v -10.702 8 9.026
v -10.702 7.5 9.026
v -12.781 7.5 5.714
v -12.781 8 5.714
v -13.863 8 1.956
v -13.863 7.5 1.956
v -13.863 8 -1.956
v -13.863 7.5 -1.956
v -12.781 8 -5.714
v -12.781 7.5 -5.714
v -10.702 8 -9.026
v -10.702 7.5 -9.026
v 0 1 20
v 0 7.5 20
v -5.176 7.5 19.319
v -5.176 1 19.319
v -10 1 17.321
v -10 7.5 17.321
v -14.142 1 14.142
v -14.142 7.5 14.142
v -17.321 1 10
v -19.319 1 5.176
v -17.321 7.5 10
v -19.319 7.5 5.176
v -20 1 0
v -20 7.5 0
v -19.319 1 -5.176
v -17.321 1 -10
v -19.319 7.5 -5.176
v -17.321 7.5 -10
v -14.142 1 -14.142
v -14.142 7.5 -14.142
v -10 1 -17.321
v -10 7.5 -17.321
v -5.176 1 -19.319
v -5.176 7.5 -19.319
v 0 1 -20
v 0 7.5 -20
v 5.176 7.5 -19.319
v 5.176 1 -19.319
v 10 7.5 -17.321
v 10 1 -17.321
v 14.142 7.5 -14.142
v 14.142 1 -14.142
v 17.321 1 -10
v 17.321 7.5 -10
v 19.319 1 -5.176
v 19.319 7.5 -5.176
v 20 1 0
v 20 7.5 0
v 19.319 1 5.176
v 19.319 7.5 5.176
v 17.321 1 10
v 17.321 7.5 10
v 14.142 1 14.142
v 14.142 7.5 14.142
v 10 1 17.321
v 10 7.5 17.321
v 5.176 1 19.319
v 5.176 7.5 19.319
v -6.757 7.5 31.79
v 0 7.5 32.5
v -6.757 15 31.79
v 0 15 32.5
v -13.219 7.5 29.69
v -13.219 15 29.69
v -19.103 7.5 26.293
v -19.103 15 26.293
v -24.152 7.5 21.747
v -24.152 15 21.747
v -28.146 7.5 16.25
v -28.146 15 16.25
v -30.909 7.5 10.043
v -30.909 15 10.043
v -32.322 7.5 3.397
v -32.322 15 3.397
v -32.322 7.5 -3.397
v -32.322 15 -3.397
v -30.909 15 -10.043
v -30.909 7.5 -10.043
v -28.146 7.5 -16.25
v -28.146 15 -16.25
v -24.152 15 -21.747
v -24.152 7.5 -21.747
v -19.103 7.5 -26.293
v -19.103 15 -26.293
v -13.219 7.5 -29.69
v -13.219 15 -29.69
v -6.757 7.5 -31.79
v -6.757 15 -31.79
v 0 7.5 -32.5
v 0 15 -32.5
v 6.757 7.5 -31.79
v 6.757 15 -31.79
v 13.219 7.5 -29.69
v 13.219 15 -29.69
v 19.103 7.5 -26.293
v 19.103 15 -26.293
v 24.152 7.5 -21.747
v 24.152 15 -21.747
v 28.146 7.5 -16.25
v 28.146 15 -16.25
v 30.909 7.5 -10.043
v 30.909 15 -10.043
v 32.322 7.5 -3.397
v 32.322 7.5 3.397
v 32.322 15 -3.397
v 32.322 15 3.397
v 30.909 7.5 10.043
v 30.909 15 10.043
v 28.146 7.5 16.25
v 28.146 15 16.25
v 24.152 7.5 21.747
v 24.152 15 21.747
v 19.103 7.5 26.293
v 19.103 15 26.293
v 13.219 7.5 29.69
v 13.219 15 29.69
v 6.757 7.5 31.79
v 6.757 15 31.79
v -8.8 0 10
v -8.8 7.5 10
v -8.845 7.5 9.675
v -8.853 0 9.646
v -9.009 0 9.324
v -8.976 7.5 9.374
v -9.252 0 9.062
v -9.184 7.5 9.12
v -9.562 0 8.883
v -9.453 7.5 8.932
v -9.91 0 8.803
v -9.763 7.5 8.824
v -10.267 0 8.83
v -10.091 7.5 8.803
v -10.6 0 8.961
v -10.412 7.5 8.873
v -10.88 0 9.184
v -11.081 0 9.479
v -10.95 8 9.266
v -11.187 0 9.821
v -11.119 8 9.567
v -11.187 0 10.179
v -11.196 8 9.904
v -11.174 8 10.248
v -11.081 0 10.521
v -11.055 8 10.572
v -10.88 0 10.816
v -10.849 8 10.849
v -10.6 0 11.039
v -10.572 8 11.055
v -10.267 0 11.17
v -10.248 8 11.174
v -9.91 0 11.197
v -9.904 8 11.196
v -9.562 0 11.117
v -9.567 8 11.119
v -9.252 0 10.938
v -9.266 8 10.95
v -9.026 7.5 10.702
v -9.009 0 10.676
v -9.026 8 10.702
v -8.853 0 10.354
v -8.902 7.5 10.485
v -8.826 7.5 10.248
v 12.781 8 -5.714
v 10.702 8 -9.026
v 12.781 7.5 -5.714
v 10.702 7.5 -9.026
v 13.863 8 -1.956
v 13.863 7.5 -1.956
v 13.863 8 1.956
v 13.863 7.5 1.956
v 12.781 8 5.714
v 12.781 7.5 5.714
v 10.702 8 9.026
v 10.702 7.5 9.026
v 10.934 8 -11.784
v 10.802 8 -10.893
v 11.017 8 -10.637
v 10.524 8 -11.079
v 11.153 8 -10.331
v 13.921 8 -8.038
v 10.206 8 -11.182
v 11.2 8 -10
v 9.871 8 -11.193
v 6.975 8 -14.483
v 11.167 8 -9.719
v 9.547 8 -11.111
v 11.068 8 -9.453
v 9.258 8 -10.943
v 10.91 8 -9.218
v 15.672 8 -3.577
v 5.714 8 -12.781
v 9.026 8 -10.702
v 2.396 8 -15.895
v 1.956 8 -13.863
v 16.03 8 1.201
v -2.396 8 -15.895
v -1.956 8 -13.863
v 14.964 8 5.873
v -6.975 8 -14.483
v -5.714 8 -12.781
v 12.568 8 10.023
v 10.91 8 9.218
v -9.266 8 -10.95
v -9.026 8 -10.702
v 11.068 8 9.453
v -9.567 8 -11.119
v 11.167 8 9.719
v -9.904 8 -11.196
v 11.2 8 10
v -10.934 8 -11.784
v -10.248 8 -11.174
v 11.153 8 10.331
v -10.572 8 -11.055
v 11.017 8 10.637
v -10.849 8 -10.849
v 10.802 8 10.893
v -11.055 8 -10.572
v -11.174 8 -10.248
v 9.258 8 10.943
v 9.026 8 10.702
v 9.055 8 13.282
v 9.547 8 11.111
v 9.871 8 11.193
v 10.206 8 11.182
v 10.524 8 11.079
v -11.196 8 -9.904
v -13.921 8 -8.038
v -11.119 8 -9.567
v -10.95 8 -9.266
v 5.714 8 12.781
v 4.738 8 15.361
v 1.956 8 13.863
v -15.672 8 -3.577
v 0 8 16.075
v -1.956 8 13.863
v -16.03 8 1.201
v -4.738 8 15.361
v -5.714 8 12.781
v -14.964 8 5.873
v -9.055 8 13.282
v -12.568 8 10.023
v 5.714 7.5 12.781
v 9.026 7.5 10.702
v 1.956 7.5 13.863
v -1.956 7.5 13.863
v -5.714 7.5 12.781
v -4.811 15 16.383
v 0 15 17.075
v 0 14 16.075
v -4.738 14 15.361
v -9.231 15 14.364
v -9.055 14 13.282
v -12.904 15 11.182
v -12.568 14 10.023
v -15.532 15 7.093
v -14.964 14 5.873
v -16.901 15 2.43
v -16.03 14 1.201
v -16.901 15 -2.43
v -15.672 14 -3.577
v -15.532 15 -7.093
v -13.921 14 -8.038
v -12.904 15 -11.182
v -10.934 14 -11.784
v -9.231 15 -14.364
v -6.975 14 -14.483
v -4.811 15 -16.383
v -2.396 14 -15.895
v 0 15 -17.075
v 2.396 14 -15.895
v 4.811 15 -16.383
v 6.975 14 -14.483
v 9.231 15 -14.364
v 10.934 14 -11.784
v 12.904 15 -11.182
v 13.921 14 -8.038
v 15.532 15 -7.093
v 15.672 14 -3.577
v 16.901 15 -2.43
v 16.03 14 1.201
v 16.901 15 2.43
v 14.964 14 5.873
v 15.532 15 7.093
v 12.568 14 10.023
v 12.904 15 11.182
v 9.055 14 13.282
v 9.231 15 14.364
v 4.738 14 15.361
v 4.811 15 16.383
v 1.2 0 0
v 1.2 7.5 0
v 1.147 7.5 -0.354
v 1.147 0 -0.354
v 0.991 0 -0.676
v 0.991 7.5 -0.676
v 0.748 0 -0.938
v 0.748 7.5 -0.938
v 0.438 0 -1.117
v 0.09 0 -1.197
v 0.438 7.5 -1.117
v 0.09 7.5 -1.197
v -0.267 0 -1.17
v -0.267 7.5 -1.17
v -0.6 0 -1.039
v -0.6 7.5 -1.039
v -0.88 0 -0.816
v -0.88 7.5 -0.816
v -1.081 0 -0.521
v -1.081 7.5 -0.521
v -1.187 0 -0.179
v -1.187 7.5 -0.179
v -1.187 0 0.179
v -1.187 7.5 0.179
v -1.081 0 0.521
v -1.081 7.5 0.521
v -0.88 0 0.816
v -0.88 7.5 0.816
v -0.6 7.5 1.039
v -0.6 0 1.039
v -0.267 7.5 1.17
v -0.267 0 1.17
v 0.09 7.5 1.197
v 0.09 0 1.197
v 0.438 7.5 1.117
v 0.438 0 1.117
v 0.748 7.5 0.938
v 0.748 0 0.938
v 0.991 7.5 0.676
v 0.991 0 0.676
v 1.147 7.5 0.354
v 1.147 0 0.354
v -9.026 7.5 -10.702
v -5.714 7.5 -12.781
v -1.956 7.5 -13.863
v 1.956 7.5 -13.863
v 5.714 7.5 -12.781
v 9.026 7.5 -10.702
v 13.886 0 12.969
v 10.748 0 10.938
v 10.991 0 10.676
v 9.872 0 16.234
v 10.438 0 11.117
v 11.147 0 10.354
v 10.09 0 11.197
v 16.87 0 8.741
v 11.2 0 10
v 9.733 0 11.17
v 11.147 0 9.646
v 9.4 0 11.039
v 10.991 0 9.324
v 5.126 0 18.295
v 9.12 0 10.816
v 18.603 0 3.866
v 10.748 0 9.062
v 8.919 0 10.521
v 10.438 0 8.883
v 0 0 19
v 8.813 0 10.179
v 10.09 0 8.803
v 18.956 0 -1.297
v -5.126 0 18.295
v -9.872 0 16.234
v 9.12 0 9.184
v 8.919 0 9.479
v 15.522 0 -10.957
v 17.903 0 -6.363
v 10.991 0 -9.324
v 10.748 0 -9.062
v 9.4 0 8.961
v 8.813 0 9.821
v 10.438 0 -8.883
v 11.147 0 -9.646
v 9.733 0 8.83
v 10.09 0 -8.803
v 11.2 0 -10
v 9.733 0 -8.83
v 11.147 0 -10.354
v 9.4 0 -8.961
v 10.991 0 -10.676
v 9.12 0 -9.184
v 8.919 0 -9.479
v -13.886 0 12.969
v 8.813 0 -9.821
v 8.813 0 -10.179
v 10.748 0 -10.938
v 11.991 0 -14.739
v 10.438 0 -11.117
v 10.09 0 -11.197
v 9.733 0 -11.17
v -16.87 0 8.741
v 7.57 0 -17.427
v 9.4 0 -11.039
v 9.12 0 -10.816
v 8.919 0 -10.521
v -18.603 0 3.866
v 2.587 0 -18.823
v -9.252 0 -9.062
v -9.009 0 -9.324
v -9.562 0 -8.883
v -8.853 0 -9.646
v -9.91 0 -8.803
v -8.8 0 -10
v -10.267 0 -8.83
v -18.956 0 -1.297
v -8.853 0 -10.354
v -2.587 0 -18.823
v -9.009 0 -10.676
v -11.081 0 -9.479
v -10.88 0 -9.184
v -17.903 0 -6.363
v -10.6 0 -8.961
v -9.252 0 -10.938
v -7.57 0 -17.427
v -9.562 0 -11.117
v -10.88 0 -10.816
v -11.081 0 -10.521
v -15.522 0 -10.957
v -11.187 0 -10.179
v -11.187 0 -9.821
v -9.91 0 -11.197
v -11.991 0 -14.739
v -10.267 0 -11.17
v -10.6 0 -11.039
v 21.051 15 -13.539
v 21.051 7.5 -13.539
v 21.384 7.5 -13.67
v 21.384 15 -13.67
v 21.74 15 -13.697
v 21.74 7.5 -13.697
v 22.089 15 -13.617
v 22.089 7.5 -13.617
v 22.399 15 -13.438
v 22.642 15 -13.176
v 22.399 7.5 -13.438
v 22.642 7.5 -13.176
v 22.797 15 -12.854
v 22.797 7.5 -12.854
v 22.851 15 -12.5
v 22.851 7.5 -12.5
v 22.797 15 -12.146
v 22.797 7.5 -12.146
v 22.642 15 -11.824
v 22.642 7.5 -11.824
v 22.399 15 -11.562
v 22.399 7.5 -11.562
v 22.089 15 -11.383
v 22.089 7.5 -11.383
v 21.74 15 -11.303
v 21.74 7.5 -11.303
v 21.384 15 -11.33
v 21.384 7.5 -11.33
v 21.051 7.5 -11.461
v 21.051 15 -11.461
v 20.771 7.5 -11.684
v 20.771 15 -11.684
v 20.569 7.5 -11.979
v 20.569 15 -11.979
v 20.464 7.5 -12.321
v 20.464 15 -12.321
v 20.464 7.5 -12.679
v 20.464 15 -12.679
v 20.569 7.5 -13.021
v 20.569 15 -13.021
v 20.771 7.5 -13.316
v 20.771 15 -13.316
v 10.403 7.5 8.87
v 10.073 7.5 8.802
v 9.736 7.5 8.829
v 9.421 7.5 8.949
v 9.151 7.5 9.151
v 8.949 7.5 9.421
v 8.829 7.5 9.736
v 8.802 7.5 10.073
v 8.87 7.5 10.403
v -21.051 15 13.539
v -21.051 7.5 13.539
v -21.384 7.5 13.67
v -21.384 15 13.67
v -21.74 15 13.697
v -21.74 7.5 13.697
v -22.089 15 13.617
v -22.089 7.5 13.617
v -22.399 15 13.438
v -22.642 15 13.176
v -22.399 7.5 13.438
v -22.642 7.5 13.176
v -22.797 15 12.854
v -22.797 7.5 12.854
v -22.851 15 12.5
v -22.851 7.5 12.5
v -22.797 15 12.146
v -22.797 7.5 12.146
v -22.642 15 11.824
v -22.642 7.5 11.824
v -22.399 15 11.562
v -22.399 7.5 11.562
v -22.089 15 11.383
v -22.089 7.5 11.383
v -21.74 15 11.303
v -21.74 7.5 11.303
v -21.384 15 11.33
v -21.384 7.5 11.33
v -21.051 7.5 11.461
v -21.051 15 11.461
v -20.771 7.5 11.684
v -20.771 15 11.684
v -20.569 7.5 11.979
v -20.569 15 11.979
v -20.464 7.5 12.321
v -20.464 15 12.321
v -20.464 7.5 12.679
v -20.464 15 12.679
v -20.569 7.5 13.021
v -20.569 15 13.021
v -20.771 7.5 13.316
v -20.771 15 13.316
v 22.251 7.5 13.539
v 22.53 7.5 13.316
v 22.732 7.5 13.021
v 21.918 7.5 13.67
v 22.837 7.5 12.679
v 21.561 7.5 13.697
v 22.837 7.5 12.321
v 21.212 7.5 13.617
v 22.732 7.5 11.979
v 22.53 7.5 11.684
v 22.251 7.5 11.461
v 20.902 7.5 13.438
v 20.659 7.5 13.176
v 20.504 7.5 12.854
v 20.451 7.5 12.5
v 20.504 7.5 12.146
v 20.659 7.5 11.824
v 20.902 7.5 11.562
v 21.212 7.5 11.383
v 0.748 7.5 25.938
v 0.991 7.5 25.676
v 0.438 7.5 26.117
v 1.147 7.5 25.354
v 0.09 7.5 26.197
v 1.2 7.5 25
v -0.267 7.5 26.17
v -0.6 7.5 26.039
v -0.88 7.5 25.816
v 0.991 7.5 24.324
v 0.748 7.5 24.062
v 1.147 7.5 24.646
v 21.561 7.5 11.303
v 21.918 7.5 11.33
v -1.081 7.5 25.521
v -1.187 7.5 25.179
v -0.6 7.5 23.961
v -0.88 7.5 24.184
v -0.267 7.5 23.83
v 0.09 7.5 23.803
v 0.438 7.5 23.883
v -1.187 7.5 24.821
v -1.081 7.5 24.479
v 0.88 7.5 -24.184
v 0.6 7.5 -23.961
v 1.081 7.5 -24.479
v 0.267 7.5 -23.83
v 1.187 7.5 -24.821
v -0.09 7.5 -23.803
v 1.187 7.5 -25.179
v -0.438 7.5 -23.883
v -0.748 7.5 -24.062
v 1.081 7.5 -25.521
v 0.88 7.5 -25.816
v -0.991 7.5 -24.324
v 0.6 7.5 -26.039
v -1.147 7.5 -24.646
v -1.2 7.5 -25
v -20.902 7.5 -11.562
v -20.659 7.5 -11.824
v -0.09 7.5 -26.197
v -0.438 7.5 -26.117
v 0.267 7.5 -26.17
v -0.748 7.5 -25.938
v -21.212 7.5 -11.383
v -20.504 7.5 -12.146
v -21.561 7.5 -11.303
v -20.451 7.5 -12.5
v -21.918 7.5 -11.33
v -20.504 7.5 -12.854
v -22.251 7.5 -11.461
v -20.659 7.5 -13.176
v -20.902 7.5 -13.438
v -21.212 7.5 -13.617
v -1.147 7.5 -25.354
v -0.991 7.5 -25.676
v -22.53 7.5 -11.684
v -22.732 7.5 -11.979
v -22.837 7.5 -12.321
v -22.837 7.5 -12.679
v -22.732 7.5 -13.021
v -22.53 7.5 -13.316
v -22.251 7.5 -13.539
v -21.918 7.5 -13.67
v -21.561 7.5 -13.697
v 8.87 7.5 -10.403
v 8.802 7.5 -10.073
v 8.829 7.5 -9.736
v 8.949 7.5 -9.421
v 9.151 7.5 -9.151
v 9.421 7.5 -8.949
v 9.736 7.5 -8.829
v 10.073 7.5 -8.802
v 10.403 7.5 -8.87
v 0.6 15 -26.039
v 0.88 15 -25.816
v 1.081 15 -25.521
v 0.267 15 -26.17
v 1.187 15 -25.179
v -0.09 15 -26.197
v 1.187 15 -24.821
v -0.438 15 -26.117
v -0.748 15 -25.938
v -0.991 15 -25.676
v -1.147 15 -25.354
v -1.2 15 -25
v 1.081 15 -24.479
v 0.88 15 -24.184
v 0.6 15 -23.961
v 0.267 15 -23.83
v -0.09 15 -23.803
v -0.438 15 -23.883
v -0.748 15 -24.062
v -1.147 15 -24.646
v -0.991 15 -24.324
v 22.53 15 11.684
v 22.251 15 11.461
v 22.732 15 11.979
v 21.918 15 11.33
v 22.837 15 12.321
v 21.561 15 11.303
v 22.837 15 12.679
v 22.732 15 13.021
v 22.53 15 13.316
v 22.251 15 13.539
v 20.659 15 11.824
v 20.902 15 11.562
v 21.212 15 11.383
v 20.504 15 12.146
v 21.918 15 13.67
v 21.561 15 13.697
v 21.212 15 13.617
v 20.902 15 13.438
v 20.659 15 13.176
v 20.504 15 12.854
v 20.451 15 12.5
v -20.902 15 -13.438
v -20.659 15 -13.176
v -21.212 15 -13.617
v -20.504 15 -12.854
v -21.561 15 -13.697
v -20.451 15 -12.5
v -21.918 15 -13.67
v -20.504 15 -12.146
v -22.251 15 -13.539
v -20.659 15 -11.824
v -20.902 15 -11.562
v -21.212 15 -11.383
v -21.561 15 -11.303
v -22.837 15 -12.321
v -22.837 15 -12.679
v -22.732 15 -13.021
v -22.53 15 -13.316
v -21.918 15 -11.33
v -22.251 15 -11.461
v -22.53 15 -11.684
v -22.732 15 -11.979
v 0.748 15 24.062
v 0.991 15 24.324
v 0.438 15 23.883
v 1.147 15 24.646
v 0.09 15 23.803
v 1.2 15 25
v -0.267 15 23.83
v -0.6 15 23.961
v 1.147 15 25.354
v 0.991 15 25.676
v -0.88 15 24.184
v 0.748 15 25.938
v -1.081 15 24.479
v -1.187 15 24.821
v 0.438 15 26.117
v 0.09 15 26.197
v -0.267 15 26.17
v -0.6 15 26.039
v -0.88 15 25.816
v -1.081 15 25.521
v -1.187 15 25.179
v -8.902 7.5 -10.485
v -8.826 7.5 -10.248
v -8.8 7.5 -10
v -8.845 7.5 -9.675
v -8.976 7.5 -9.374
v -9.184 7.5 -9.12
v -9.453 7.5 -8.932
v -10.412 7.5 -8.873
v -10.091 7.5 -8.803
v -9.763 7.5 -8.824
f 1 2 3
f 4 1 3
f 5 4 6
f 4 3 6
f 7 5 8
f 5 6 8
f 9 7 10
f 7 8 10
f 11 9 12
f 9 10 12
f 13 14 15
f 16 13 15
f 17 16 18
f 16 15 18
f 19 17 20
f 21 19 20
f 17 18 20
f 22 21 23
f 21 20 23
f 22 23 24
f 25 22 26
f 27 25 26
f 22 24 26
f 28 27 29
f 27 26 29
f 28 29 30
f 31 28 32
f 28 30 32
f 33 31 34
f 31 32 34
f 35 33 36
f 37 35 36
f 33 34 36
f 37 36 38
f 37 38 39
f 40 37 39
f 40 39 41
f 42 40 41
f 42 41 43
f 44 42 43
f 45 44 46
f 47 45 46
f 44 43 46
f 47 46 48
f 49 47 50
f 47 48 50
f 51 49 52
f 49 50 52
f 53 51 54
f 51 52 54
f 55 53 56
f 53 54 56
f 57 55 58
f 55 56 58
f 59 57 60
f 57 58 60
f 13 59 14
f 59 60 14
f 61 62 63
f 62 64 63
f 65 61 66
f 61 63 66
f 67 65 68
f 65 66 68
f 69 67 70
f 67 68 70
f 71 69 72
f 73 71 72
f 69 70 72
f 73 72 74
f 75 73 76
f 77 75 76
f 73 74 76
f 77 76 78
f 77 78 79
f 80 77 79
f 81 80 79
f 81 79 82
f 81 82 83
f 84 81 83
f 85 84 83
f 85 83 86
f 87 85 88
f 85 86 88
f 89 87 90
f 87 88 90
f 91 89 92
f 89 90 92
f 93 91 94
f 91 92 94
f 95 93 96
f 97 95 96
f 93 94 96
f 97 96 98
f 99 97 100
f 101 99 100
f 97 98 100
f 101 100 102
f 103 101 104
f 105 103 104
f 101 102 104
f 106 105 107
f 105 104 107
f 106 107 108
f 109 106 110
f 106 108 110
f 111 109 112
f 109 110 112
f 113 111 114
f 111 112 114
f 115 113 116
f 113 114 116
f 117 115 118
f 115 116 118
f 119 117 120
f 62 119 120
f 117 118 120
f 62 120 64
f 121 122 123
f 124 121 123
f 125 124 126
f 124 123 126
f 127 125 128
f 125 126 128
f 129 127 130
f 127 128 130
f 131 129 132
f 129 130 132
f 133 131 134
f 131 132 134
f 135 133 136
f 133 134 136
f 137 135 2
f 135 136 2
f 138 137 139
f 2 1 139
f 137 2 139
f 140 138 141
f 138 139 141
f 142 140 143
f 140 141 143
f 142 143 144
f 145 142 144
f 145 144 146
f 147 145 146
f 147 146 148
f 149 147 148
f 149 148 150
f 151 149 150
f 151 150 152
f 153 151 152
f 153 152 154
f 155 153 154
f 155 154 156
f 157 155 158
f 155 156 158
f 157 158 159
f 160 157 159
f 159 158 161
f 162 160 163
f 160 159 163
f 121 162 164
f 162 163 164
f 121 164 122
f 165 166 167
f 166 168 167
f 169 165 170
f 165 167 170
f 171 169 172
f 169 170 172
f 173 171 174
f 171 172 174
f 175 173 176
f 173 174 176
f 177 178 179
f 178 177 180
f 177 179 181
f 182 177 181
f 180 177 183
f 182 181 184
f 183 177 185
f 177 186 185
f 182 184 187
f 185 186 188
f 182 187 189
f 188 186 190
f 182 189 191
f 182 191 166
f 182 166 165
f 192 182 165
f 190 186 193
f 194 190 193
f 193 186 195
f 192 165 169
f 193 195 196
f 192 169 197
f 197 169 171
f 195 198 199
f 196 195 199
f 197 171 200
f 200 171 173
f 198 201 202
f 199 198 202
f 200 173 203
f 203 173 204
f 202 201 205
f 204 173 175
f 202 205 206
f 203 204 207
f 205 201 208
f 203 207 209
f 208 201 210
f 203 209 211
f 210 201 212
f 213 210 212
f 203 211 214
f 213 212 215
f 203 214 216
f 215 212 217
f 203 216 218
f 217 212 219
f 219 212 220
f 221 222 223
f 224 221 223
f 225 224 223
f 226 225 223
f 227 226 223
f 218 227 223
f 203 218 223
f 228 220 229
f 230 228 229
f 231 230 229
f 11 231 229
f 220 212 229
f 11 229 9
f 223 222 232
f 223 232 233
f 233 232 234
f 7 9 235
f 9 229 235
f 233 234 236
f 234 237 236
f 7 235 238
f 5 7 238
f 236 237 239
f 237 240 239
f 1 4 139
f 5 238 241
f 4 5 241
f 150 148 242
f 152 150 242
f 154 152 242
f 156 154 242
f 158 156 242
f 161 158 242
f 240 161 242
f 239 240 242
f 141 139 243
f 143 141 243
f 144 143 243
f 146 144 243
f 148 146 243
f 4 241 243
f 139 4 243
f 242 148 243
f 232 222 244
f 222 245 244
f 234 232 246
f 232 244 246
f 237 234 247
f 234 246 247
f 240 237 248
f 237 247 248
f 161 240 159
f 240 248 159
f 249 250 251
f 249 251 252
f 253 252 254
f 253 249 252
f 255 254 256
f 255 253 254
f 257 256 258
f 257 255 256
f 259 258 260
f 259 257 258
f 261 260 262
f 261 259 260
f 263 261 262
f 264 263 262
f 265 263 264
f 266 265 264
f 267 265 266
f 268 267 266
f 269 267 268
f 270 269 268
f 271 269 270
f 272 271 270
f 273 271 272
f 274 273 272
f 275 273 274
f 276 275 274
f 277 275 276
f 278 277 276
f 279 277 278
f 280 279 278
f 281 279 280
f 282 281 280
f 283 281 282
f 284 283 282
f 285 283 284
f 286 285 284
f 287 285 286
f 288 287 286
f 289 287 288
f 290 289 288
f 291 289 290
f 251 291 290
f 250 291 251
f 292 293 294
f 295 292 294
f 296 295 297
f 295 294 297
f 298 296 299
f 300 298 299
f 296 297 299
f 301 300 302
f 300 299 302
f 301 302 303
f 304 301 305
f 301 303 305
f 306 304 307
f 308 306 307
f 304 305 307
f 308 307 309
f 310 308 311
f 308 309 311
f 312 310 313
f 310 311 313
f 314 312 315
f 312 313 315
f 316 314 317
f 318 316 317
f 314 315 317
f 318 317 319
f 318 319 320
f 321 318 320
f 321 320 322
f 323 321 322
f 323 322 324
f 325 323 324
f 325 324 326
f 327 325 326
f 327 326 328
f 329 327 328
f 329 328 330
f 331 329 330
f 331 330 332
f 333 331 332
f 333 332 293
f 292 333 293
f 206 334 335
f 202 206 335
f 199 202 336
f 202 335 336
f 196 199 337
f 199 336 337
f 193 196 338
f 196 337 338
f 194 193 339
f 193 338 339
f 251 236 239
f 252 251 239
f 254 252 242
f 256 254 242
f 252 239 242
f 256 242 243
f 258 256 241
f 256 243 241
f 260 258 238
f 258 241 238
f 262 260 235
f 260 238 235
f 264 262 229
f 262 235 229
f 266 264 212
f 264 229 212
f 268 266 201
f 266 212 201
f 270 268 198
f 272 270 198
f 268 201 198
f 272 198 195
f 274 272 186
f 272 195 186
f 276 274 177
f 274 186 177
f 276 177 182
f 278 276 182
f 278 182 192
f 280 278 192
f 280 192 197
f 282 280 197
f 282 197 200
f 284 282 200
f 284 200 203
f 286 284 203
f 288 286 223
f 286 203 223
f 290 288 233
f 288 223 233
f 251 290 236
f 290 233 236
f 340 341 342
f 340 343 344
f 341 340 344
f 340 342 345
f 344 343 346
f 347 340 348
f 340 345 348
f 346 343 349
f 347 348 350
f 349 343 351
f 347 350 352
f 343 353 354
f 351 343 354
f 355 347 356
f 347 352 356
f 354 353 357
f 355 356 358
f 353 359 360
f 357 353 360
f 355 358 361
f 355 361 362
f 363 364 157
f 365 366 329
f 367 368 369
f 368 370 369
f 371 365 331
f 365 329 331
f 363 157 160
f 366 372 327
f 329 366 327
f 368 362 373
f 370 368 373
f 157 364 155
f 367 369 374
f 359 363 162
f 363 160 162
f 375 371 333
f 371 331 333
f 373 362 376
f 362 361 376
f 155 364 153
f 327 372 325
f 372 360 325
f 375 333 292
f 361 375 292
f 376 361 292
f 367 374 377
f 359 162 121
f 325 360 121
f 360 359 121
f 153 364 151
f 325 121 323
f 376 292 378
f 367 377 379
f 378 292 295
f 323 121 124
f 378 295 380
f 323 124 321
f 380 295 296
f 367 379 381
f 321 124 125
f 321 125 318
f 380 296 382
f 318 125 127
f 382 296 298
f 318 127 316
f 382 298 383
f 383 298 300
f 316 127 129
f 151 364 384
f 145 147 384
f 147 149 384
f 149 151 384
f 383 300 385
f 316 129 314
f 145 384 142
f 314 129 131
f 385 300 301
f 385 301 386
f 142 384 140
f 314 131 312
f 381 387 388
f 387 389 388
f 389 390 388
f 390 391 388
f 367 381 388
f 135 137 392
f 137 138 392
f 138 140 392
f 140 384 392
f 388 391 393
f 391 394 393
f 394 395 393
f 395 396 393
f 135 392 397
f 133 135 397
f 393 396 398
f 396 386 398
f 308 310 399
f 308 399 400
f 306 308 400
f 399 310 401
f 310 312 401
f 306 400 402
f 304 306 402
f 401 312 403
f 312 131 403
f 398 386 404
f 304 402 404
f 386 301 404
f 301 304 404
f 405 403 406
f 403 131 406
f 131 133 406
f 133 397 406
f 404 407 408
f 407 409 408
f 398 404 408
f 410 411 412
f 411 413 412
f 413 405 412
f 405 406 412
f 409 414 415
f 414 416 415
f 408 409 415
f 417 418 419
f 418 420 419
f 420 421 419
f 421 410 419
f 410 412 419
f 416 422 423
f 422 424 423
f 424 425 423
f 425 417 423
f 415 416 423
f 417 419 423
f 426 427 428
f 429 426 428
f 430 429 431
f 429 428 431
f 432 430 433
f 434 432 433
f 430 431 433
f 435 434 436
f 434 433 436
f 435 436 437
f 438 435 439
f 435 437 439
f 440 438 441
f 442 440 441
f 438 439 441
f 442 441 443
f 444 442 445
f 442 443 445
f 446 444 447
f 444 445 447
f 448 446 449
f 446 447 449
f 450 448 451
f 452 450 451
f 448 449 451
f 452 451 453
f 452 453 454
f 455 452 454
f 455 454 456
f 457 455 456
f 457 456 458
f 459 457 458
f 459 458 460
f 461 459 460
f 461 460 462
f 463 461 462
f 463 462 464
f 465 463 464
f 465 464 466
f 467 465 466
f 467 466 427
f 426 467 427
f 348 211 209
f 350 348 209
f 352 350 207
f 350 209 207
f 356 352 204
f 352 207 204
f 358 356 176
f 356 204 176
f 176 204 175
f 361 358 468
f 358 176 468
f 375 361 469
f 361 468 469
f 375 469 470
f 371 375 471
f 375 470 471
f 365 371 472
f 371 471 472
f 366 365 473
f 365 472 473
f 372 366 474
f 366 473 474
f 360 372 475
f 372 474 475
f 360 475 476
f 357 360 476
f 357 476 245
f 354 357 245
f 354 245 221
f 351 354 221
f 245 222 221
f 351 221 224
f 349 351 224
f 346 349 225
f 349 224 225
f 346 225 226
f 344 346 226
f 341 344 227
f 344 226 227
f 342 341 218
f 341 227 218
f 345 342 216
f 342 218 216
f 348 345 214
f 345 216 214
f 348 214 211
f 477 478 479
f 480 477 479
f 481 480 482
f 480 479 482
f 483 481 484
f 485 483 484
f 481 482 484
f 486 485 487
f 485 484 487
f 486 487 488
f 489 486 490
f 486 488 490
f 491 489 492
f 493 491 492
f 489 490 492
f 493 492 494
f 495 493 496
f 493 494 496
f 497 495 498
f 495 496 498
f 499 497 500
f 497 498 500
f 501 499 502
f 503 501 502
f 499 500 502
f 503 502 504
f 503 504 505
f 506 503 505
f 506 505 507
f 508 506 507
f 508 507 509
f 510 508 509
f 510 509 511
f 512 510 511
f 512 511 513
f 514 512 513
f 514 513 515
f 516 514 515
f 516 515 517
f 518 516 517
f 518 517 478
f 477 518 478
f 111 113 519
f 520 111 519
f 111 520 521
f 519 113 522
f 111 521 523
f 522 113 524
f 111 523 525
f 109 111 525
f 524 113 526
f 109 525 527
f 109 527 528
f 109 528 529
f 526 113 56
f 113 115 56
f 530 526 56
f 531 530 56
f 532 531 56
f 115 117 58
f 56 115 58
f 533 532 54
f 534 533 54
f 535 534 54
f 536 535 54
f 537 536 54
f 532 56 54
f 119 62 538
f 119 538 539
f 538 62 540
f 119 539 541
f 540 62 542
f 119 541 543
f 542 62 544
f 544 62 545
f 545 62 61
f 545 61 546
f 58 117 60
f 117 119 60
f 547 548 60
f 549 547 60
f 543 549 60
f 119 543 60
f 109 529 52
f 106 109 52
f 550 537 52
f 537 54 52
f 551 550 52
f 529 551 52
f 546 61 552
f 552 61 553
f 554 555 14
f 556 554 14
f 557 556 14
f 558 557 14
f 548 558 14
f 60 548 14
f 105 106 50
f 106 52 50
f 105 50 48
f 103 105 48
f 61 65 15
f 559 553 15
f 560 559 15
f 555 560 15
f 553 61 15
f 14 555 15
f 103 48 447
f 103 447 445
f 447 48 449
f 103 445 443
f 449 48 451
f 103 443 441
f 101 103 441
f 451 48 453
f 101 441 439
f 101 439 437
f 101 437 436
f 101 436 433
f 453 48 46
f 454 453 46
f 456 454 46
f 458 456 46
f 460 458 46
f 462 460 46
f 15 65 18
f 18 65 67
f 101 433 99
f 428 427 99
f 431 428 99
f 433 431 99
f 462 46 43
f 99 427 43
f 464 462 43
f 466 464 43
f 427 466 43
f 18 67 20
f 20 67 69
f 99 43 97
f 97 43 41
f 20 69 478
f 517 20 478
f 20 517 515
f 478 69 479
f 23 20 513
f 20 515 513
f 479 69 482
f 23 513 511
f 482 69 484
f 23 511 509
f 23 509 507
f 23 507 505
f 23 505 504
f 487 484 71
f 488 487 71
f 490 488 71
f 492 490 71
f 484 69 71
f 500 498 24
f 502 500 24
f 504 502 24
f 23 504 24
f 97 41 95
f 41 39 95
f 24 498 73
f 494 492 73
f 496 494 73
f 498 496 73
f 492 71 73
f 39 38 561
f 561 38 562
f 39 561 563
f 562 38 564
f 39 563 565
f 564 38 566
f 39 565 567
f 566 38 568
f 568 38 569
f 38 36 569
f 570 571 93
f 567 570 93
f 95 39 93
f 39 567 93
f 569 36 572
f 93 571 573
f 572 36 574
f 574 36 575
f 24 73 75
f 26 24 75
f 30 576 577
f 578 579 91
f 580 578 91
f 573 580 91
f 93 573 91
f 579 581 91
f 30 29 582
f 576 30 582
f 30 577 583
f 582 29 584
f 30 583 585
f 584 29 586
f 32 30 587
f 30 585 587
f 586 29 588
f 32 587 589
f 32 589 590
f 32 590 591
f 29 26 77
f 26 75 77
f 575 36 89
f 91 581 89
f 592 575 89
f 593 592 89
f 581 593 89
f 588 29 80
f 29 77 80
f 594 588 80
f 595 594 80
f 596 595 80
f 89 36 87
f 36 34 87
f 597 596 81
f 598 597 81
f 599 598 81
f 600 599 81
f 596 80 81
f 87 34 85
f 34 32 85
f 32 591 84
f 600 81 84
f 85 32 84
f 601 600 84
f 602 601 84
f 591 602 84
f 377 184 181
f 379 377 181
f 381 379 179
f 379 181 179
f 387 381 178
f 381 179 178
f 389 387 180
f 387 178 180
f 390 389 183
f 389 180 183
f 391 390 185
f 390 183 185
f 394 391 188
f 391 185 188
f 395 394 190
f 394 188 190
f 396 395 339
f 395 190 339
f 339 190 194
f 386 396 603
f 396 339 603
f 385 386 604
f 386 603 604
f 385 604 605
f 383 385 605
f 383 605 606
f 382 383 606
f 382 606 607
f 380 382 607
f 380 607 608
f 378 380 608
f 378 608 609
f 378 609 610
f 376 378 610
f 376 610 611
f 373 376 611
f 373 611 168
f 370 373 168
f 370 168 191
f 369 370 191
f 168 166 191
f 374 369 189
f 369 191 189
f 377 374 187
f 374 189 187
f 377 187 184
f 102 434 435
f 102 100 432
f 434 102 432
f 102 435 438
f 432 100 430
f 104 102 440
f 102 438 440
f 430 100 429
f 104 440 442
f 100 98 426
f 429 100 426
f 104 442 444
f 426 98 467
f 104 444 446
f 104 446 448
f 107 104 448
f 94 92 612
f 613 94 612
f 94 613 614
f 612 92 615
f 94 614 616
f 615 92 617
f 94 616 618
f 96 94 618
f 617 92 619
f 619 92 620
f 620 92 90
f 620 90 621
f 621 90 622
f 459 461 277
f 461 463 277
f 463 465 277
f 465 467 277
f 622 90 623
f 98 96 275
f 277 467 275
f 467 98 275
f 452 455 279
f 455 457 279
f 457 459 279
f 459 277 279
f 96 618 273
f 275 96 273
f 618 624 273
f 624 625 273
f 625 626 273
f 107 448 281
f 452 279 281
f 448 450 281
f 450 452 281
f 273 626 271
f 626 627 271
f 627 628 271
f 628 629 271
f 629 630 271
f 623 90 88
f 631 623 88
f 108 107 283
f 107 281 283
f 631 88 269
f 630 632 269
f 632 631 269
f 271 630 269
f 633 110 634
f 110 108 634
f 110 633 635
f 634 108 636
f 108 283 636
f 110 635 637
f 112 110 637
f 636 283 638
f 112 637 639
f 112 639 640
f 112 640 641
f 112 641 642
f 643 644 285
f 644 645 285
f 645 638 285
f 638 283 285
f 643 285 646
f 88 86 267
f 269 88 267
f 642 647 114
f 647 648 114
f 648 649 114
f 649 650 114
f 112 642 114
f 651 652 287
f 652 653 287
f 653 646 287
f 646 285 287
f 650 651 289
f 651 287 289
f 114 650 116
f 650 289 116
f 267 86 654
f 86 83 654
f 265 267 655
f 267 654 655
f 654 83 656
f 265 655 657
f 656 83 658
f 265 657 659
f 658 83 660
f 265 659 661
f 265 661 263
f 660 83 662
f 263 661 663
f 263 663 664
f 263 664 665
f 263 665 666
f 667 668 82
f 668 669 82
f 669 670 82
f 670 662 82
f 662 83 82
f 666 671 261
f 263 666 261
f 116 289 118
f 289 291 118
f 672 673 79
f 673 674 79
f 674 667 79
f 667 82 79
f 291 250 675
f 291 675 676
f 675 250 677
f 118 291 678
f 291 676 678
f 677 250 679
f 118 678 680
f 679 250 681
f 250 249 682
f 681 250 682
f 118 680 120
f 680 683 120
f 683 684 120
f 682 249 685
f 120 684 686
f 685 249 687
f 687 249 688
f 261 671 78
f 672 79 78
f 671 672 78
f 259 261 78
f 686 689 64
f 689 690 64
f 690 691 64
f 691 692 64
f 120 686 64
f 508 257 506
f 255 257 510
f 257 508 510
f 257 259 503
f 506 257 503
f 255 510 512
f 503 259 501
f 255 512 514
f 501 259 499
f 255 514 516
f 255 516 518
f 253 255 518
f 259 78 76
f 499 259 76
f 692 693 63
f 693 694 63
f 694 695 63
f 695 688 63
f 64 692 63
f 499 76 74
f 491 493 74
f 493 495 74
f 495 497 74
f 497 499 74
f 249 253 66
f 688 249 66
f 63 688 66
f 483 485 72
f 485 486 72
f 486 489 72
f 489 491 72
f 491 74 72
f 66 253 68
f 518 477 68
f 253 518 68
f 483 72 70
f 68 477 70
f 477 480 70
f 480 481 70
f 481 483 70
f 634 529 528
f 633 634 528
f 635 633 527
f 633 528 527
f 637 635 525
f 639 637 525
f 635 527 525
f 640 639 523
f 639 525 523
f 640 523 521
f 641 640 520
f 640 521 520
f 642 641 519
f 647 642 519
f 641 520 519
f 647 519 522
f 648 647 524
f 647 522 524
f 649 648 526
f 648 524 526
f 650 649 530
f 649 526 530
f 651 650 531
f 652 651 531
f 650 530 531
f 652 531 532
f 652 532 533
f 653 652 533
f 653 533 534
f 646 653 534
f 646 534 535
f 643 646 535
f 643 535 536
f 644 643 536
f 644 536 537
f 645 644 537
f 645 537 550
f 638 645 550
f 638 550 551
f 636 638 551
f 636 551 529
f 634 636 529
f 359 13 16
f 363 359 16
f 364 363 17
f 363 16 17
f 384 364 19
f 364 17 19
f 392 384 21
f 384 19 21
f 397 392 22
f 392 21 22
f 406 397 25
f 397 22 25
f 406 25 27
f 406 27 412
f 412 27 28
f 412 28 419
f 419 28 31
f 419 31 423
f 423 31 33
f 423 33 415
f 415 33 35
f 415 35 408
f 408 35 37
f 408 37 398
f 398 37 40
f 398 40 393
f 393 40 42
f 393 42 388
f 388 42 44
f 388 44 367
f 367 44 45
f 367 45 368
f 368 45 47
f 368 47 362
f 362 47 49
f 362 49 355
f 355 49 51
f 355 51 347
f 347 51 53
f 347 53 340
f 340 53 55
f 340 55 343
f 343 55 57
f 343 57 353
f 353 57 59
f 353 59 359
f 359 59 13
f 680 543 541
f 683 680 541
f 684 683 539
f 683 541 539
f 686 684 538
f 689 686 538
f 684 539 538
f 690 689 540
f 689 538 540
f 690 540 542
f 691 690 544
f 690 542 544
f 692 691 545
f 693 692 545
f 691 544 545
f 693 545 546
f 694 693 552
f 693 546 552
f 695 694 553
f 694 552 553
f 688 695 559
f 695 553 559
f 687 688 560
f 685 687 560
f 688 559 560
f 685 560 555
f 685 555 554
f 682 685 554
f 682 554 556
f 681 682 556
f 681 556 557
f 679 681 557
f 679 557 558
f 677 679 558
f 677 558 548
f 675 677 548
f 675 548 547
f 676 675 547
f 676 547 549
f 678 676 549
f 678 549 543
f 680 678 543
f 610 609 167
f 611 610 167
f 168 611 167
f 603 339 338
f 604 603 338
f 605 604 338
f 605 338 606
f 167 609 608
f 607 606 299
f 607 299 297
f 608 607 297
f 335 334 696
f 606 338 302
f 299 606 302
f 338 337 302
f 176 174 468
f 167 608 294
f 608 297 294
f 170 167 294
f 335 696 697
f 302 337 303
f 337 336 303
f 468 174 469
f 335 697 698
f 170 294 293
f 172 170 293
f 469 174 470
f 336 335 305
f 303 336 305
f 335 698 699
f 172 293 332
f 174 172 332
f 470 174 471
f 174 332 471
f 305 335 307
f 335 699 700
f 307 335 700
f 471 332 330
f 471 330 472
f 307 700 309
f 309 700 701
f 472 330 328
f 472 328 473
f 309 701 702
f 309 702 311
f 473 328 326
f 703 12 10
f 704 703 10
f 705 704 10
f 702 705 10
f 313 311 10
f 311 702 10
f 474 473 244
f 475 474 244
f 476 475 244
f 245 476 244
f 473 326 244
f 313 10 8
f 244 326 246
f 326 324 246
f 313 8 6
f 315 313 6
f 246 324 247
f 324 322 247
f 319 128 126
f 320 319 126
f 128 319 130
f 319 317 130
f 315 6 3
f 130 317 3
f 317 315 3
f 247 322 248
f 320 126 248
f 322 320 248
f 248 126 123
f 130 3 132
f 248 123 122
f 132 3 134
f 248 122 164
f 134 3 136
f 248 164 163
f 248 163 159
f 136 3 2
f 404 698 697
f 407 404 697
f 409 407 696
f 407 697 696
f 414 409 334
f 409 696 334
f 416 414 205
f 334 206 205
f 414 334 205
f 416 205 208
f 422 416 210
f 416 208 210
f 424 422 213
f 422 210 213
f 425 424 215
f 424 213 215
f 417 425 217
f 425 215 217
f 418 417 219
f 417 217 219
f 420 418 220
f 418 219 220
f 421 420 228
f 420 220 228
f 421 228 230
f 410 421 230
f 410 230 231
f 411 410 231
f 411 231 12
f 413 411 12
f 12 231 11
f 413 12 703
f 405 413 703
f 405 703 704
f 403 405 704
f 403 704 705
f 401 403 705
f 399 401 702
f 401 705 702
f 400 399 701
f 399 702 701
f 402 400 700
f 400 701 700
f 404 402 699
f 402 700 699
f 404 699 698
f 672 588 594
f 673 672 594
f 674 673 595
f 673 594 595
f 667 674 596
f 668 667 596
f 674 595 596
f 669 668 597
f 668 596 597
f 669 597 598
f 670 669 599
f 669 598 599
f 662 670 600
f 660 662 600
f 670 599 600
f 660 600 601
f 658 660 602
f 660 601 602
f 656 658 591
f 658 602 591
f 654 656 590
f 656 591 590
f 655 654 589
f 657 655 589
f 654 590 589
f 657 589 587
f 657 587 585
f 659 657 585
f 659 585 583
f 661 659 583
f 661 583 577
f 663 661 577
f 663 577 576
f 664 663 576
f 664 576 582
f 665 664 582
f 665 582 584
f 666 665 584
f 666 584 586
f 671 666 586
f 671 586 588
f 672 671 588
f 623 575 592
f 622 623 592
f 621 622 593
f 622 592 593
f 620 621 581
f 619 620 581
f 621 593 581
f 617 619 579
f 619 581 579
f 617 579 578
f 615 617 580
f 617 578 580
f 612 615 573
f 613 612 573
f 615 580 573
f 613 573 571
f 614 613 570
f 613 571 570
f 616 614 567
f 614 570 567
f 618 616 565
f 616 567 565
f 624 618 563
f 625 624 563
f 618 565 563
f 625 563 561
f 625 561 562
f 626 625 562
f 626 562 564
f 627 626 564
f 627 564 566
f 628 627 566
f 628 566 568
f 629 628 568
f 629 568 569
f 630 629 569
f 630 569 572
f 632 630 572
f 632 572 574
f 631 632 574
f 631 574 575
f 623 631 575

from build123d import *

# Parameters (mm, degrees)
F_2_4_2_4_DURCHMESSER_BOHRUNG1_D = 2.4
KREISMUSTER1_COUNT               = 6
F_2_4_2_4_DURCHMESSER_BOHRUNG2_D = 2.4
FASE1_SIZE                       = 1
FASE2_SIZE                       = 1


with BuildPart() as part:
    # Skizze1 → Rotation1 (revolve)
    with BuildSketch(Plane.XY, mode=Mode.PRIVATE) as rotation1_sk:
        Polygon((0, 0), (20, 0), (20, 7.5), (32.5, 7.5), (32.5, 15), (16.075, 15), (16.075, 8), (14, 8), (14, 7.5), (0, 7.5), align=None)
    revolve(rotation1_sk.sketch.rotate(Axis((0, 0, 0), (0, -1, 0)), 90), axis=Axis((0, 0, 0), (0, -1, 0)))

    # Ø2.4 (2.4) Durchmesser Bohrung1 (through all)
    with Locations(Plane(origin=(0, 15, 0), x_dir=(1, 0, 0), z_dir=(0, 1, 0))):
        with Locations((0, 25)):
            f_2_4_2_4_durchmesser_bohrung1 = Hole(F_2_4_2_4_DURCHMESSER_BOHRUNG1_D / 2)

    # Kreismuster1: Ø2.4 (2.4) Durchmesser Bohrung1 ×6 about axis
    kreismuster1_axis = Axis((0, 0, 0), (0, 1, 0))
    for i in range(1, KREISMUSTER1_COUNT):
        add(f_2_4_2_4_durchmesser_bohrung1.rotate(kreismuster1_axis, i * 360 / KREISMUSTER1_COUNT), mode=Mode.SUBTRACT)

    # Ø2.4 (2.4) Durchmesser Bohrung2 (through all)
    with Locations(Plane(origin=(0, 0, 0), x_dir=(-1, 0, 0), z_dir=(0, -1, 0))):
        with Locations((0, 0), (10, 10), (-10, -10), (-10, 10), (10, -10)):
            Hole(F_2_4_2_4_DURCHMESSER_BOHRUNG2_D / 2)

    # Fase1
    fase1_edges = [part.edges().sort_by_distance(p)[0] for p in [
        (0, 15, -16.075),
    ]]
    chamfer(fase1_edges, length=FASE1_SIZE)

    # Fase2
    fase2_edges = [part.edges().sort_by_distance(p)[0] for p in [
        (0, 0, -20),
    ]]
    chamfer(fase2_edges, length=FASE2_SIZE)


solid = part.part
